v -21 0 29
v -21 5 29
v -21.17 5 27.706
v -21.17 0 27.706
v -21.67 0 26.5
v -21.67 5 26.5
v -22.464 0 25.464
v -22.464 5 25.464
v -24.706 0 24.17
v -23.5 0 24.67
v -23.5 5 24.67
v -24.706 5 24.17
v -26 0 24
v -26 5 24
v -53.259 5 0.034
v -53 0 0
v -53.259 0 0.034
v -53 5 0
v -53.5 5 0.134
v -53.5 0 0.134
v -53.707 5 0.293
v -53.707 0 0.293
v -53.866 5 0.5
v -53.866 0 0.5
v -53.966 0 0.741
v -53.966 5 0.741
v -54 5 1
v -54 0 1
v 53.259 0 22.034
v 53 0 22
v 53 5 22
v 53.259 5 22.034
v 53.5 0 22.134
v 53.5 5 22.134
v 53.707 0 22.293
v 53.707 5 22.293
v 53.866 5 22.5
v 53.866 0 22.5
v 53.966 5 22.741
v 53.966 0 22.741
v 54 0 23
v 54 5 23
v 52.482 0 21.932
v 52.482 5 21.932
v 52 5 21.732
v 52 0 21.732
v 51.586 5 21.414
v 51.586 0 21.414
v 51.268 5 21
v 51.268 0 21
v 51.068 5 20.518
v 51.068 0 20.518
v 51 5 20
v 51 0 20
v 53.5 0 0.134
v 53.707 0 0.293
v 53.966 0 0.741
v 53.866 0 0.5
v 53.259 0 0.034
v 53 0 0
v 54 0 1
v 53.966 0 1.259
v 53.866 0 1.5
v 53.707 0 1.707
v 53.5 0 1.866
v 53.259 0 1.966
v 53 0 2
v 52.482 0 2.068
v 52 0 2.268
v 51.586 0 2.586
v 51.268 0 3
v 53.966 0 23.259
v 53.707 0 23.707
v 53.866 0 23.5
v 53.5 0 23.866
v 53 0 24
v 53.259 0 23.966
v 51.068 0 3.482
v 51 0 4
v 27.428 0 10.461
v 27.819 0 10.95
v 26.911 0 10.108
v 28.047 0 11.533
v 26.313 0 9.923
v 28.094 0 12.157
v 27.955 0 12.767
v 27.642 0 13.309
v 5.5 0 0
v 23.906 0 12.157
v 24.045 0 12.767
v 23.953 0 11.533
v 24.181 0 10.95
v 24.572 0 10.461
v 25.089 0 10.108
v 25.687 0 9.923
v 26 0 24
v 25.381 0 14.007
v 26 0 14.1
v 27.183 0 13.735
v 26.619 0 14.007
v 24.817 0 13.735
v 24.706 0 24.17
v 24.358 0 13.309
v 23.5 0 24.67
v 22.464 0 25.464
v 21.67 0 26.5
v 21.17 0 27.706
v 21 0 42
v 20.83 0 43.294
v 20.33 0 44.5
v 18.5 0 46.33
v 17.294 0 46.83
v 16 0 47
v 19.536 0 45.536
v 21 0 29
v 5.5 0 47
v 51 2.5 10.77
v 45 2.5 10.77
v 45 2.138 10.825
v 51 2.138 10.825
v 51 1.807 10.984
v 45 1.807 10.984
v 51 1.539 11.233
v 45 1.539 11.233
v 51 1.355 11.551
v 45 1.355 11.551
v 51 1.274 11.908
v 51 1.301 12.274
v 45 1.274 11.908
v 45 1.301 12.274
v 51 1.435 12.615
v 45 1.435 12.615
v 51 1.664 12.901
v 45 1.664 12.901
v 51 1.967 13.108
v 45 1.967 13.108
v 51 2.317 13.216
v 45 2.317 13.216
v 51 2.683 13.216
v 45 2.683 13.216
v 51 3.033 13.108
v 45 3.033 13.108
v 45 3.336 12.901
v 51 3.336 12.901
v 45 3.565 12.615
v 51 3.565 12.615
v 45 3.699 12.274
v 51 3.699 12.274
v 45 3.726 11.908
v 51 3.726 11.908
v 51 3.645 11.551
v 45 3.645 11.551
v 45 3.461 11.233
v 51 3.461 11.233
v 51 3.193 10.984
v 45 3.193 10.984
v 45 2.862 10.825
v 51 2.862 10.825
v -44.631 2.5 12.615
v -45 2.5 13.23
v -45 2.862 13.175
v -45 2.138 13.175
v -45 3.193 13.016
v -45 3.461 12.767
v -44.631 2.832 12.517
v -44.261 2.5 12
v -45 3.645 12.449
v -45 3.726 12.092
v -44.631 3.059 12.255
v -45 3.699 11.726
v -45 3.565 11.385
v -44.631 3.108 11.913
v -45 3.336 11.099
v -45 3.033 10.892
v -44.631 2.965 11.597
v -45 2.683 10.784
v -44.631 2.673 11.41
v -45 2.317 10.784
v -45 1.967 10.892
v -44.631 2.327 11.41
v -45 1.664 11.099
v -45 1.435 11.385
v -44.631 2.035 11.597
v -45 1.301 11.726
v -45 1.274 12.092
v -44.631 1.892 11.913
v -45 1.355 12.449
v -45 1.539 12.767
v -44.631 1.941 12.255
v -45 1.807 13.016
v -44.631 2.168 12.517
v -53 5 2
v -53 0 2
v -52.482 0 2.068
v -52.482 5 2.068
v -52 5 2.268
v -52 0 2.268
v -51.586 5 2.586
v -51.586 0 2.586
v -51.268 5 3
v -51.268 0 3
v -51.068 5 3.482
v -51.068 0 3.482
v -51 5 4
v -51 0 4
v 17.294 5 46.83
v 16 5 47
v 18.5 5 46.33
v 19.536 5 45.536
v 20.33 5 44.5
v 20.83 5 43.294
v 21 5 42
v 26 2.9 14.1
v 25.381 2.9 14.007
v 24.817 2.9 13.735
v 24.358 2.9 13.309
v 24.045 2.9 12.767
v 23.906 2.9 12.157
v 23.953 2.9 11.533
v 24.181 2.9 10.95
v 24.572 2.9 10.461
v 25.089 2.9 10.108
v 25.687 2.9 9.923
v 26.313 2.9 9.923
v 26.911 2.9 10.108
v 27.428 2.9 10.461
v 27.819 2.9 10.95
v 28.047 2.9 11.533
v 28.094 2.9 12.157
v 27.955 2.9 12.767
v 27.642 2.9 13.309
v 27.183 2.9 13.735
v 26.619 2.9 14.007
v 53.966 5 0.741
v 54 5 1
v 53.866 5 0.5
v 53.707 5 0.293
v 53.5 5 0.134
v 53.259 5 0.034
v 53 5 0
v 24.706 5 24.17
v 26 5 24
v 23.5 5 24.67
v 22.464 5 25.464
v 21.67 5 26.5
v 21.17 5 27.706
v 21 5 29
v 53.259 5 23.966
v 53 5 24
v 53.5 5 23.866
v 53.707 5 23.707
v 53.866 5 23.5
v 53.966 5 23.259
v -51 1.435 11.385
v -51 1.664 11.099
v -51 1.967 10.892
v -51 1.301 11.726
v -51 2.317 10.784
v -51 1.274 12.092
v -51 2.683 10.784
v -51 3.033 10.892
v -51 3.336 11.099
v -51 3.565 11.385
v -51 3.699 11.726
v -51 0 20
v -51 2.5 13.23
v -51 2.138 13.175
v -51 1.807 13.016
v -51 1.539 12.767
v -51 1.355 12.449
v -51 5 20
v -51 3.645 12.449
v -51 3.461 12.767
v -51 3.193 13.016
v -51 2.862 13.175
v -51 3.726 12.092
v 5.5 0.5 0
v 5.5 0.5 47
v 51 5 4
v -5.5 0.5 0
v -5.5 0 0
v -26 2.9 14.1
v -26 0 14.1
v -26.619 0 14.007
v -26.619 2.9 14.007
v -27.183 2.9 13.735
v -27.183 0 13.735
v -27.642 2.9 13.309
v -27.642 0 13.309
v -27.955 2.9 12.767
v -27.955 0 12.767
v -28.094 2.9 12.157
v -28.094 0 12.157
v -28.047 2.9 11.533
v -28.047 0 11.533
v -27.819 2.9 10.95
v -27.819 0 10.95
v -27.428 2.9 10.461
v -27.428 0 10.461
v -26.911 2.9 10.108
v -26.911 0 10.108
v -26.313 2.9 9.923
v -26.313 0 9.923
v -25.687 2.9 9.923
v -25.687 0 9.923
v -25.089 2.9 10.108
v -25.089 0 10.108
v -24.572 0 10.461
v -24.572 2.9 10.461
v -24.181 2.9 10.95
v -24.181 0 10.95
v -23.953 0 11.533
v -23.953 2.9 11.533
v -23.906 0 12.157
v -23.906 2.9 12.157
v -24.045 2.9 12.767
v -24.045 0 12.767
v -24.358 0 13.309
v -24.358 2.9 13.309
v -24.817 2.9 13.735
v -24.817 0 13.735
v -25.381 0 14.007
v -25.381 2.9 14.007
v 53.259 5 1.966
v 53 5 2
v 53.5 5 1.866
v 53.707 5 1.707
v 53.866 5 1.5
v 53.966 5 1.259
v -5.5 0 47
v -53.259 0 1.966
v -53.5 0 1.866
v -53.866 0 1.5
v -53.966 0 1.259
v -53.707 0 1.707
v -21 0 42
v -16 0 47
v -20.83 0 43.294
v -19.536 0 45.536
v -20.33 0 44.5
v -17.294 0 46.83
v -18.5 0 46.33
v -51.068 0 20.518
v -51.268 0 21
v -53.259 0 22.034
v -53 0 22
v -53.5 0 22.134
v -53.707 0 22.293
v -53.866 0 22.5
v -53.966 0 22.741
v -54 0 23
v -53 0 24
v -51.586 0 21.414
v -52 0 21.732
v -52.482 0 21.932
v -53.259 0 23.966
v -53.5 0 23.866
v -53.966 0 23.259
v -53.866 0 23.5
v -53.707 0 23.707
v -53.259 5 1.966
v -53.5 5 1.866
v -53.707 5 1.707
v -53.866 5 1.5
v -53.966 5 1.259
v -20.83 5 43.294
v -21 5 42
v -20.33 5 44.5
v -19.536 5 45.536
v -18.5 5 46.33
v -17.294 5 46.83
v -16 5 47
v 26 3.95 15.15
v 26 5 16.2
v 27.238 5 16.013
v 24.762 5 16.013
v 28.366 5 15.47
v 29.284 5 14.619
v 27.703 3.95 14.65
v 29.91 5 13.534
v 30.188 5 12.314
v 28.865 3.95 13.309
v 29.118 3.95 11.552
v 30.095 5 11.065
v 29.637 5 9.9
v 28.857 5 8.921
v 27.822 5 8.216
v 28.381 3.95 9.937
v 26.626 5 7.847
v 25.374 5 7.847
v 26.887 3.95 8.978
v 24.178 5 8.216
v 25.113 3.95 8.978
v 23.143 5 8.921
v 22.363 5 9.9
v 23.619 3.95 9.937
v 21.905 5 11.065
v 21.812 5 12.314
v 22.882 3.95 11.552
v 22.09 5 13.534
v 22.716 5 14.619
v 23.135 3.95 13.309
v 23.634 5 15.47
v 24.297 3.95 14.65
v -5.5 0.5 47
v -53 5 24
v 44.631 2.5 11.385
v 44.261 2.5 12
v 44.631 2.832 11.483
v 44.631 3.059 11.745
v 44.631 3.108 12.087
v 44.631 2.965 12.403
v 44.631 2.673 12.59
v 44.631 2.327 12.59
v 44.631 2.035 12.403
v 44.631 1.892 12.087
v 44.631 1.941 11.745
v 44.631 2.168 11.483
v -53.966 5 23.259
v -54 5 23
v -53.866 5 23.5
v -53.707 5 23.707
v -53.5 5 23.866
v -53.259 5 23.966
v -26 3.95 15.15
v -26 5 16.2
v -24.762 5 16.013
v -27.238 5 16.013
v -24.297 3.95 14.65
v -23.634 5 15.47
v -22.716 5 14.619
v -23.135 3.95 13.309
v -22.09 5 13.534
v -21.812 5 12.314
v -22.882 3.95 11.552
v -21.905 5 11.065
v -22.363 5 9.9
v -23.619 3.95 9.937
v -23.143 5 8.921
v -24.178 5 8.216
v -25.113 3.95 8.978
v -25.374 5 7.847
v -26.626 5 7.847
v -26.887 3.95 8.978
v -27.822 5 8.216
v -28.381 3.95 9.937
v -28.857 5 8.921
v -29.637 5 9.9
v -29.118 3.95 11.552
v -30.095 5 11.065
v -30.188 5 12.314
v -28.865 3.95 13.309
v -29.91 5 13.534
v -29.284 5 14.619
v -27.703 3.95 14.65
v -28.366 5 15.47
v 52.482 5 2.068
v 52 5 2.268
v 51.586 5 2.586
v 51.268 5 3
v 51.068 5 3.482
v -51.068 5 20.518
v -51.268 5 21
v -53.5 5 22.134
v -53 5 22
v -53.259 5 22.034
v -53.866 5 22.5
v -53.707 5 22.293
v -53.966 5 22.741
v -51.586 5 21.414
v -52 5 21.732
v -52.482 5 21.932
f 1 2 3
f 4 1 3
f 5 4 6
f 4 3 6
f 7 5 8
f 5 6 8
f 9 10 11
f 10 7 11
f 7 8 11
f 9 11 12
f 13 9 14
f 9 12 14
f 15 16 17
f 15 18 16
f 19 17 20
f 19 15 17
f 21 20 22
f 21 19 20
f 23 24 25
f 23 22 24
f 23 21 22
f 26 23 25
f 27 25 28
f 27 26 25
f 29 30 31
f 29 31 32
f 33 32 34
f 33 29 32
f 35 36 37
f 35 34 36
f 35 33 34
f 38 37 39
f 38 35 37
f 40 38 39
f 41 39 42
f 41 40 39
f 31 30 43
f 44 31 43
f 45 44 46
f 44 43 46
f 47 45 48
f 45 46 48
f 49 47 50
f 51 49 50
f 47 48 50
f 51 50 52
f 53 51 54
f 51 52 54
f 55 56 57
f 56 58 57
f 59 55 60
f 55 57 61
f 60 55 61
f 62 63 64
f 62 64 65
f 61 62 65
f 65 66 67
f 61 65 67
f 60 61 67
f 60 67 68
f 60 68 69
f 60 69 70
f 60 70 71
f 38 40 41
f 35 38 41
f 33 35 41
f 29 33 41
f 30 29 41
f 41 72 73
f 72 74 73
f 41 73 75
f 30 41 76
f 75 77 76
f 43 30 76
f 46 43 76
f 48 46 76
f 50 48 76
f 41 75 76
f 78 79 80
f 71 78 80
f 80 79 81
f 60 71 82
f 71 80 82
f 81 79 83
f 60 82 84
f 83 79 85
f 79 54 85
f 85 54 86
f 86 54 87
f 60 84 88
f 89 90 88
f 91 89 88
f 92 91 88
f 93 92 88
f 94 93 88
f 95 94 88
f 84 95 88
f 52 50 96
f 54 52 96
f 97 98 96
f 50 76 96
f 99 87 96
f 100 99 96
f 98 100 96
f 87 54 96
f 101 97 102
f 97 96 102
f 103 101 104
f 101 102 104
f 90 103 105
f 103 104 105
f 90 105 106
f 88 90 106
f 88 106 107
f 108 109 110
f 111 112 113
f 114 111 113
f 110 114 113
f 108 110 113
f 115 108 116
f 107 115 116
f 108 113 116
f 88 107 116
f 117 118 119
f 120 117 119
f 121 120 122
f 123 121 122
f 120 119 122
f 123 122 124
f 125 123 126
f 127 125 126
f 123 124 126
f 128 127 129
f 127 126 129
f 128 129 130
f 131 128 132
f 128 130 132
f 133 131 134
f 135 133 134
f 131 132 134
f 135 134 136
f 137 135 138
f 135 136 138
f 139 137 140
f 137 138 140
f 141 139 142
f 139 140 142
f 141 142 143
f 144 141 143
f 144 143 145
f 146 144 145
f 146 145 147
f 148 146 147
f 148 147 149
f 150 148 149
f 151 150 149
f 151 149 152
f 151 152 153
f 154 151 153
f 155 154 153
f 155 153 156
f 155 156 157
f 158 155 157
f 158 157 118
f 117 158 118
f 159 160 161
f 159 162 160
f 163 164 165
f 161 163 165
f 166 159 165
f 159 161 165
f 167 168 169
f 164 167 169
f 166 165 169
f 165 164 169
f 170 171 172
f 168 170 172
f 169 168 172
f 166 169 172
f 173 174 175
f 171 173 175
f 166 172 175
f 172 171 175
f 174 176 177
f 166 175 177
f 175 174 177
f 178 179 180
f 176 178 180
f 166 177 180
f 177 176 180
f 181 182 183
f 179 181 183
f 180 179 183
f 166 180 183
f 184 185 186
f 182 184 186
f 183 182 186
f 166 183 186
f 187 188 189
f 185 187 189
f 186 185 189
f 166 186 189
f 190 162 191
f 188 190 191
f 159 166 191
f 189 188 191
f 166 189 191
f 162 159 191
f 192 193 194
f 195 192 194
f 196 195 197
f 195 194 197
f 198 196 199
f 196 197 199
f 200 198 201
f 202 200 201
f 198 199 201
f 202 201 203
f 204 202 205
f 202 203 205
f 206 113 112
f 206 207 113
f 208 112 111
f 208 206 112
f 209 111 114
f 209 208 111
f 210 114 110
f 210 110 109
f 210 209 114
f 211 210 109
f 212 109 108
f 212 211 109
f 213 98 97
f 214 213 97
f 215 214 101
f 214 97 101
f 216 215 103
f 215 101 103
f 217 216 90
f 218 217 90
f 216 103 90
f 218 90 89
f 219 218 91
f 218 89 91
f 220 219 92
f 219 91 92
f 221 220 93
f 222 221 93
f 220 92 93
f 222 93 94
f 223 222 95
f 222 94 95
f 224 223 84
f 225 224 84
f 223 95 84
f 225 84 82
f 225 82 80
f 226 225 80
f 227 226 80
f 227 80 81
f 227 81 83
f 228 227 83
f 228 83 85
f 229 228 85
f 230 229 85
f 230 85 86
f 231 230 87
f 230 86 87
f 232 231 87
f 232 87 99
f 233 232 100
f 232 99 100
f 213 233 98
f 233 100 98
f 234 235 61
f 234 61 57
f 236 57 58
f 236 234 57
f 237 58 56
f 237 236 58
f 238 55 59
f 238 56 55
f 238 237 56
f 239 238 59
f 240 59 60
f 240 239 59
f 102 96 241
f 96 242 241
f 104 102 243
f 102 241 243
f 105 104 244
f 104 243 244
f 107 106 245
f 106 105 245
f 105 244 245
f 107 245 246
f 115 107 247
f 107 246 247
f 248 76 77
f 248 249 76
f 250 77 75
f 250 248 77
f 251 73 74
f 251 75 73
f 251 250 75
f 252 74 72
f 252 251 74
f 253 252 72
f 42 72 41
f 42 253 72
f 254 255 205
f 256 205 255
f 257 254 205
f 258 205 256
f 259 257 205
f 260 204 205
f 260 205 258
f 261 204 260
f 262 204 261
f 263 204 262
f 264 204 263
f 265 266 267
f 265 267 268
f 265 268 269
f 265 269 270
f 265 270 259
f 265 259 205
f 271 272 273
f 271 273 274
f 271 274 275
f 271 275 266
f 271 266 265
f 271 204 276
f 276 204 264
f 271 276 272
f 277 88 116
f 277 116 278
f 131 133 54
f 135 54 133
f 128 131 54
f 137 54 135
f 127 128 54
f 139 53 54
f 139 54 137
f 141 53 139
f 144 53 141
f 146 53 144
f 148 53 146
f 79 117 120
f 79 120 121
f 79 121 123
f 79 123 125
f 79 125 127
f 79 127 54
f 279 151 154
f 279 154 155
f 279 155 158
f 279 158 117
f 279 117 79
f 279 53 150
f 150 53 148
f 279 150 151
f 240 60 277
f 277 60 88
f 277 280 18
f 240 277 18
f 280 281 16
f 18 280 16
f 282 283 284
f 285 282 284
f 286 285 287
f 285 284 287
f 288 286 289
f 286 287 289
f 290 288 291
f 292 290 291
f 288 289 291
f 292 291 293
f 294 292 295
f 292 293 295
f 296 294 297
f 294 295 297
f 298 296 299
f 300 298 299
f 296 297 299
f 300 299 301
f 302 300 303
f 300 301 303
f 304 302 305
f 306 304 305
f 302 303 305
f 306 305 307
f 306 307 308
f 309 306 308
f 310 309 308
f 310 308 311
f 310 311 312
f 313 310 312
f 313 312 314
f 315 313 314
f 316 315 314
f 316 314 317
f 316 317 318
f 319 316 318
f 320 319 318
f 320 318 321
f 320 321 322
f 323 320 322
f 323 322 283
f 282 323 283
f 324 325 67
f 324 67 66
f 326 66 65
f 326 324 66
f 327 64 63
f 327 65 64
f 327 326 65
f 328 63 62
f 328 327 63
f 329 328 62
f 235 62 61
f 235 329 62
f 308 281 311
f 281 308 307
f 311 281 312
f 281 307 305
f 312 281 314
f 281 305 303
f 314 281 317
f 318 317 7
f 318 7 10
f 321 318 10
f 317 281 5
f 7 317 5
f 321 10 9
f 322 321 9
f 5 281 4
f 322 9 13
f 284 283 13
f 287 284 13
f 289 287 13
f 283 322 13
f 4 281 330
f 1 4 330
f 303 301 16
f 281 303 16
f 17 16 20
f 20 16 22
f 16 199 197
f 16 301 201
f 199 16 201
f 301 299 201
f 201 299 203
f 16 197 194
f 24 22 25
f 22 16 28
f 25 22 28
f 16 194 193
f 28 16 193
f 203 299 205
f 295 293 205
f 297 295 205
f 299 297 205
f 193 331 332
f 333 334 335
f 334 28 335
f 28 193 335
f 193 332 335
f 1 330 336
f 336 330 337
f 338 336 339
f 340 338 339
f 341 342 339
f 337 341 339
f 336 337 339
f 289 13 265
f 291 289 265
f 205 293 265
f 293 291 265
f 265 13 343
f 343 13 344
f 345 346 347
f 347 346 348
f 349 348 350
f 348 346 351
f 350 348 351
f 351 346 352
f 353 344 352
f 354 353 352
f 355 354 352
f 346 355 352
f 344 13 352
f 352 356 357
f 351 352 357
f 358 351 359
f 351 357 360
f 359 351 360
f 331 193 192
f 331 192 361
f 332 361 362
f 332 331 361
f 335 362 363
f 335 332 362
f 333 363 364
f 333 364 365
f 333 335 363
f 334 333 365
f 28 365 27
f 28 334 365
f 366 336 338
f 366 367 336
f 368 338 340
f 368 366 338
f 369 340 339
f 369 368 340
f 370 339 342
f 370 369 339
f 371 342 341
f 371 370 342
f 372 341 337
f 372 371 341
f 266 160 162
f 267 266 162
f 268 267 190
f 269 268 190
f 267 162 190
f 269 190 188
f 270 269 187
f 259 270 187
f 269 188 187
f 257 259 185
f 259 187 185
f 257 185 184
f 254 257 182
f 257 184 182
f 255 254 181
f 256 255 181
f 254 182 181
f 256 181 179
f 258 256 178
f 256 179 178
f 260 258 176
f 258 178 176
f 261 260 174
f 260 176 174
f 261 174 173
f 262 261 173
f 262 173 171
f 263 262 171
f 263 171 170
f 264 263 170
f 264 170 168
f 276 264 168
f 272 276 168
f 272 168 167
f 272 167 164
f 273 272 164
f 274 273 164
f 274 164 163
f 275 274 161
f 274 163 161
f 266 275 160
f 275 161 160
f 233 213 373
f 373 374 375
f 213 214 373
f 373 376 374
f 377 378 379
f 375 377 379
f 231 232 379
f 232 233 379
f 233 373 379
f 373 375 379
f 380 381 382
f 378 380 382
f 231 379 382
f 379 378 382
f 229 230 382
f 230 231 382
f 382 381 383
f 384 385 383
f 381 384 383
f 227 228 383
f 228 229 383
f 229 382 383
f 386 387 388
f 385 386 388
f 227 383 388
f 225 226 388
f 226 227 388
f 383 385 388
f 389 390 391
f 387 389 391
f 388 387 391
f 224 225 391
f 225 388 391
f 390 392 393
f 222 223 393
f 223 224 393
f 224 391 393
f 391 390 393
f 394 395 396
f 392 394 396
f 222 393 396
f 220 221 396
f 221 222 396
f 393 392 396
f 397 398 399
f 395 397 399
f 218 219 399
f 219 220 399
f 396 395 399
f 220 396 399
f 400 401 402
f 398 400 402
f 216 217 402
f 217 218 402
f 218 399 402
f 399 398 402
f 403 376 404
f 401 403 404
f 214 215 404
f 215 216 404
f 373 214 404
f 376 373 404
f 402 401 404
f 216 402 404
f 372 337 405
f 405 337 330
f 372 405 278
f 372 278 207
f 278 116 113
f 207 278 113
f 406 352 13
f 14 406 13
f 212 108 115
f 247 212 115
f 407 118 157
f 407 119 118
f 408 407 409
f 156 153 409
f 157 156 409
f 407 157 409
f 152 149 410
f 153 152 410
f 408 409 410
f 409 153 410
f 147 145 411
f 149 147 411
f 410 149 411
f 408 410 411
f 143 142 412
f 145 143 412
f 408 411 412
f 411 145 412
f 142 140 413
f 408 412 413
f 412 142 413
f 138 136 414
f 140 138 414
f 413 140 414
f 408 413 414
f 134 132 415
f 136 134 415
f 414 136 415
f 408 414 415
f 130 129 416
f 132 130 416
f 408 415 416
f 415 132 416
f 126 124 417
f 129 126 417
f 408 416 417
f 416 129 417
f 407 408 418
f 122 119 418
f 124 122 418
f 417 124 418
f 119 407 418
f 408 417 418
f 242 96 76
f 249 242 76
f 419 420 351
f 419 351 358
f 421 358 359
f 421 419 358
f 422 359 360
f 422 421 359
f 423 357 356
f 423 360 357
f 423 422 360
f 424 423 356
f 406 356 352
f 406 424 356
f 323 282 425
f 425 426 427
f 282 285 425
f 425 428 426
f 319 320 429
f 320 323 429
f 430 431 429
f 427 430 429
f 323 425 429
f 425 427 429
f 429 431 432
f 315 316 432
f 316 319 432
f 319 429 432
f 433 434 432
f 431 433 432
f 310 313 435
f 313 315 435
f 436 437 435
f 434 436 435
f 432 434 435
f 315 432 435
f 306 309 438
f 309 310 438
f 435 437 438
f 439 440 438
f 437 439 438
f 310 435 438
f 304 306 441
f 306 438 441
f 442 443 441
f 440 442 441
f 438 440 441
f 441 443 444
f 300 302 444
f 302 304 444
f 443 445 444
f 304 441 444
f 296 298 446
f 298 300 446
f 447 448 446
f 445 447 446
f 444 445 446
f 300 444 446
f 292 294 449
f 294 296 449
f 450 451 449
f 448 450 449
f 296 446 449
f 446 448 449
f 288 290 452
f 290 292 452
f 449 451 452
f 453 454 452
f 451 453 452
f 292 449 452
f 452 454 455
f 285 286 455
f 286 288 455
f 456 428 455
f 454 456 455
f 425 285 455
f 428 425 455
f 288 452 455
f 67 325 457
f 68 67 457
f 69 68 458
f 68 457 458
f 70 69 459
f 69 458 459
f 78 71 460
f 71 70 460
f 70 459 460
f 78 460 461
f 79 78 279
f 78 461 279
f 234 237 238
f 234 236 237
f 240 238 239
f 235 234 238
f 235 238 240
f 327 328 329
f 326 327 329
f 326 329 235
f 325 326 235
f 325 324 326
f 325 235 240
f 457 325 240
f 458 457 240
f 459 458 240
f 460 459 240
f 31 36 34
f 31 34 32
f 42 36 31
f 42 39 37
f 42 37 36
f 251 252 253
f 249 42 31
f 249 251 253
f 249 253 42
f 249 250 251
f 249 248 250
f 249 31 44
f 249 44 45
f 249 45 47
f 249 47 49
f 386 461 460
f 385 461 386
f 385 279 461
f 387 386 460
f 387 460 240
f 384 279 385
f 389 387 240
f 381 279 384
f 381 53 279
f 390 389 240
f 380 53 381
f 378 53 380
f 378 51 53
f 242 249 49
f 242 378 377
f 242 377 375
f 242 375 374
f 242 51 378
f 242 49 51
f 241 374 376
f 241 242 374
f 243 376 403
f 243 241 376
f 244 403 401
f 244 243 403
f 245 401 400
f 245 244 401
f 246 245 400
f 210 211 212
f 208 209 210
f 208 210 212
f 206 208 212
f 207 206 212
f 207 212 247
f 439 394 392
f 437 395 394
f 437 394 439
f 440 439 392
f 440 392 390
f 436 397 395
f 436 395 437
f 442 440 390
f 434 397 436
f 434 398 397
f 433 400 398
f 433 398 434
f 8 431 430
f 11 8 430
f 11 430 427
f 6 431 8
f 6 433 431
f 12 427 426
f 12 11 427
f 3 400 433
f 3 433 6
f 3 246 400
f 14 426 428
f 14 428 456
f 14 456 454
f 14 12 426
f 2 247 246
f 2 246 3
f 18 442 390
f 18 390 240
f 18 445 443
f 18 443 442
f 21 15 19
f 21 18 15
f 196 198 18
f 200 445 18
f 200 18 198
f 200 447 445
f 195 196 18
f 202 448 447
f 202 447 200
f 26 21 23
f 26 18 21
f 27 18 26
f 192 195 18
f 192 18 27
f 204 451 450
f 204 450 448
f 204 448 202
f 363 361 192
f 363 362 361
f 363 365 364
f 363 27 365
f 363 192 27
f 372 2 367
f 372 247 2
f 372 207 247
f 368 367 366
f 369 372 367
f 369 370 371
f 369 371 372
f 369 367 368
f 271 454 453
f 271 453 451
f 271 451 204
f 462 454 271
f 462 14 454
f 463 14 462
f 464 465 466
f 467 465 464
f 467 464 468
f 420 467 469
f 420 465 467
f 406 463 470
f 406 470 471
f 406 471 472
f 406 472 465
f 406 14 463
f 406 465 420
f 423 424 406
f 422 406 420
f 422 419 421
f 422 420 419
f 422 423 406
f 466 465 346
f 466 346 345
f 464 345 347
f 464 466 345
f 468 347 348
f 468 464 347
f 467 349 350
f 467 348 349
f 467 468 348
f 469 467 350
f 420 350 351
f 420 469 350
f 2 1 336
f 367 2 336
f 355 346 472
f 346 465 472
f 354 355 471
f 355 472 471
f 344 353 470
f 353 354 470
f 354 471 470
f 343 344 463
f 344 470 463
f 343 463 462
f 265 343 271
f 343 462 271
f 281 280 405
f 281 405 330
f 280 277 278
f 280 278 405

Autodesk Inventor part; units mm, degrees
ref_plane "YZ Plane" through (0, 0, 0) normal (1, 0, 0) x (0, 1, 0)
ref_plane "XZ Plane" through (0, 0, 0) normal (0, 1, 0) x (-1, 0, 0)
sketch "Skizze1" plane through (0, 0, 0) normal (0, 1, 0) x (-1, 0, 0)
  line L0 (-54, 0) -> (54, 0)
  line L1 (54, 0) -> (54, 24)
  line L2 (54, 24) -> (21, 24)
  line L3 (21, 24) -> (21, 47)
  line L4 (21, 47) -> (-21, 47)
  line L5 (-21, 47) -> (-21, 24)
  line L6 (-21, 24) -> (-54, 24)
  line L7 (-54, 24) -> (-54, 0)
  point P0 (0, 0)
  point P1 (0, 0)
  dimension "d0" = 108
  dimension "d1" = 24
  dimension "d2" = 33
  dimension "d3" = 23
  dimension "d4" = 42
extrude "Extrusion1" add sketch "Skizze1" along normal blind 5
sketch "Skizze2" plane through (54, 0, 24) normal (1, 0, 0) x (0, 0, -1)
  line L0 (0, 0) -> (24, 0) projected
  line L1 (24, 0) -> (24, 5) projected
  line L2 (0, 5) -> (24, 5) projected
  line L3 (0, 0) -> (0, 5) projected
  line L4 (2, 0) -> (22, 0)
  line L5 (22, 0) -> (22, 5)
  line L6 (22, 5) -> (2, 5)
  line L7 (2, 5) -> (2, 0)
  dimension "d7" = 2
  dimension "d8" = 2
extrude "Extrusion2" cut sketch "Skizze2" against normal blind 3 contours L7 L2 L5 L0
sketch "Skizze3" plane through (-54, 0, 0) normal (-1, 0, 0) x (0, 0, 1)
  line L0 (0, 0) -> (24, 0) projected
  line L1 (24, 0) -> (24, 5) projected
  line L2 (0, 5) -> (24, 5) projected
  line L3 (0, 0) -> (0, 5) projected
  line L4 (2, 0) -> (22, 0)
  line L5 (22, 0) -> (22, 5)
  line L6 (22, 5) -> (2, 5)
  line L7 (2, 5) -> (2, 0)
  dimension "d11" = 2
  dimension "d12" = 2
extrude "Extrusion3" cut sketch "Skizze3" against normal blind 3 contours L7 L2 L5 L0
fillet "Rundung1" radius 1 8 edges at (-54, 2.5, 0) (-54, 2.5, 2) (-54, 2.5, 22) (-54, 2.5, 24) (54, 2.5, 24) (54, 2.5, 22) (54, 2.5, 2) (54, 2.5, 0)
fillet "Rundung2" radius 5 4 edges at (21, 2.5, 24) (21, 2.5, 47) (-21, 2.5, 47) (-21, 2.5, 24)
sketch "Skizze4" plane through (53, 0, 0) normal (0, 0, -1) x (-1, 0, 0)
  line L0 (58.5, -0.5) -> (47.5, -0.5)
  line L1 (47.5, -0.5) -> (47.5, 0.5)
  line L2 (47.5, 0.5) -> (58.5, 0.5)
  line L3 (58.5, 0.5) -> (58.5, -0.5)
  line L4 (58.5, -0.5) -> (47.5, 0.5) construction
  line L5 (47.5, -0.5) -> (58.5, 0.5) construction
  point P0 (53, 0)
  dimension "d17" = 11
  dimension "d18" = 1
extrude "Extrusion4" cut sketch "Skizze4" against normal through all
sketch "Skizze6" plane through (0, 5, 0) normal (0, 1, 0) x (1, 0, 0)
  line L0 (53, 0) -> (-53, 0) projected
  point P0 (0, 0)
  point P1 (-26, -12)
  point P2 (26, -12)
  dimension "d31" = 12
  dimension "d32" = 26
  dimension "d33" = 26
hole "Bohrung2" at (-26, 5, 12) at (26, 5, 12) direction (0, -1, 0) diameter 4.2 end through all countersink diameter 8.4 countersink angle 90
sketch "Skizze7" plane through (51, 0, 24) normal (1, 0, 0) x (0, 0, -1)
  line L0 (22, 5) -> (22, 0) projected
  line L1 (2, 5) -> (22, 5) projected
  point P0 (24, 0)
  point P1 (12, 2.5)
  dimension "d41" = 2.5
  dimension "d42" = 10
hole "Bohrung3" at (51, 2.5, 12) direction (-1, 0, 0) diameter 2.459 depth 6 tip angle 118 thread size "M3x0.5" class "6H" standard "ANSI Metric M Profile"
sketch "Skizze8" plane through (-51, 0, 0) normal (-1, 0, 0) x (0, 0, 1)
  line L0 (2, 5) -> (22, 5) projected
  line L1 (2, 0) -> (2, 5) projected
  point P0 (0, 0)
  point P1 (12, 2.5)
  dimension "d50" = 2.5
  dimension "d51" = 10
hole "Bohrung4" at (-51, 2.5, 12) direction (1, 0, 0) diameter 2.459 depth 6 tip angle 118 thread size "M3x0.5" class "6H" standard "ANSI Metric M Profile"
ref_plane "Arbeitsebene1" through (-51, 0, 12) normal (0, 0, -1) x (-1, 0, 0)
fillet "Rundung3" radius 2 2 edges at (51, 2.5, 2) (51, 2.5, 22)
fillet "Rundung4" radius 2 2 edges at (-51, 2.5, 22) (-51, 2.5, 2)
properties part number "Grundplatte"
